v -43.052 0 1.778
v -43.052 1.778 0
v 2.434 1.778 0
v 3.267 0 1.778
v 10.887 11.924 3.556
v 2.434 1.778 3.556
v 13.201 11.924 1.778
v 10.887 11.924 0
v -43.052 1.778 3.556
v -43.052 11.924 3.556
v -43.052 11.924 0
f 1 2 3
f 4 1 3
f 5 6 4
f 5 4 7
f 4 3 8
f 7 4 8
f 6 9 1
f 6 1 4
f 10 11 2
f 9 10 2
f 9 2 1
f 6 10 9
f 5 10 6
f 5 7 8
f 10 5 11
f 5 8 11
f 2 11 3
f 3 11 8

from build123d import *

# Parameters (mm, degrees)
F1_DEPTH = 3.556
F2_SIZE  = 1.77799


# Not quite as in the source:
# - a fillet or chamfer is up to 0.001 mm smaller than in the source, because OpenCascade refuses the exact size


with BuildPart() as f1:
    # F0 (on Top) → F1 (new body)
    with BuildSketch(Plane.XY):
        Polygon((-43.0519394577, 11.9240293279), (-43.0519394577, 0), (3.2667792402, 0), (13.2010905072, 11.9240293279), align=None)
    extrude(amount=F1_DEPTH)

    # F2 (size 1.778 in the source; OpenCascade refuses exactly that, so slightly less here)
    f2_edges = [f1.edges().sort_by_distance(p)[0] for p in [
        (8.233935, 5.962015, 0),
        (8.233935, 5.962015, 3.556),
        (-19.89258, 0, 0),
        (-19.89258, 0, 3.556),
    ]]
    chamfer(f2_edges, length=F2_SIZE)


solid = f1.part
